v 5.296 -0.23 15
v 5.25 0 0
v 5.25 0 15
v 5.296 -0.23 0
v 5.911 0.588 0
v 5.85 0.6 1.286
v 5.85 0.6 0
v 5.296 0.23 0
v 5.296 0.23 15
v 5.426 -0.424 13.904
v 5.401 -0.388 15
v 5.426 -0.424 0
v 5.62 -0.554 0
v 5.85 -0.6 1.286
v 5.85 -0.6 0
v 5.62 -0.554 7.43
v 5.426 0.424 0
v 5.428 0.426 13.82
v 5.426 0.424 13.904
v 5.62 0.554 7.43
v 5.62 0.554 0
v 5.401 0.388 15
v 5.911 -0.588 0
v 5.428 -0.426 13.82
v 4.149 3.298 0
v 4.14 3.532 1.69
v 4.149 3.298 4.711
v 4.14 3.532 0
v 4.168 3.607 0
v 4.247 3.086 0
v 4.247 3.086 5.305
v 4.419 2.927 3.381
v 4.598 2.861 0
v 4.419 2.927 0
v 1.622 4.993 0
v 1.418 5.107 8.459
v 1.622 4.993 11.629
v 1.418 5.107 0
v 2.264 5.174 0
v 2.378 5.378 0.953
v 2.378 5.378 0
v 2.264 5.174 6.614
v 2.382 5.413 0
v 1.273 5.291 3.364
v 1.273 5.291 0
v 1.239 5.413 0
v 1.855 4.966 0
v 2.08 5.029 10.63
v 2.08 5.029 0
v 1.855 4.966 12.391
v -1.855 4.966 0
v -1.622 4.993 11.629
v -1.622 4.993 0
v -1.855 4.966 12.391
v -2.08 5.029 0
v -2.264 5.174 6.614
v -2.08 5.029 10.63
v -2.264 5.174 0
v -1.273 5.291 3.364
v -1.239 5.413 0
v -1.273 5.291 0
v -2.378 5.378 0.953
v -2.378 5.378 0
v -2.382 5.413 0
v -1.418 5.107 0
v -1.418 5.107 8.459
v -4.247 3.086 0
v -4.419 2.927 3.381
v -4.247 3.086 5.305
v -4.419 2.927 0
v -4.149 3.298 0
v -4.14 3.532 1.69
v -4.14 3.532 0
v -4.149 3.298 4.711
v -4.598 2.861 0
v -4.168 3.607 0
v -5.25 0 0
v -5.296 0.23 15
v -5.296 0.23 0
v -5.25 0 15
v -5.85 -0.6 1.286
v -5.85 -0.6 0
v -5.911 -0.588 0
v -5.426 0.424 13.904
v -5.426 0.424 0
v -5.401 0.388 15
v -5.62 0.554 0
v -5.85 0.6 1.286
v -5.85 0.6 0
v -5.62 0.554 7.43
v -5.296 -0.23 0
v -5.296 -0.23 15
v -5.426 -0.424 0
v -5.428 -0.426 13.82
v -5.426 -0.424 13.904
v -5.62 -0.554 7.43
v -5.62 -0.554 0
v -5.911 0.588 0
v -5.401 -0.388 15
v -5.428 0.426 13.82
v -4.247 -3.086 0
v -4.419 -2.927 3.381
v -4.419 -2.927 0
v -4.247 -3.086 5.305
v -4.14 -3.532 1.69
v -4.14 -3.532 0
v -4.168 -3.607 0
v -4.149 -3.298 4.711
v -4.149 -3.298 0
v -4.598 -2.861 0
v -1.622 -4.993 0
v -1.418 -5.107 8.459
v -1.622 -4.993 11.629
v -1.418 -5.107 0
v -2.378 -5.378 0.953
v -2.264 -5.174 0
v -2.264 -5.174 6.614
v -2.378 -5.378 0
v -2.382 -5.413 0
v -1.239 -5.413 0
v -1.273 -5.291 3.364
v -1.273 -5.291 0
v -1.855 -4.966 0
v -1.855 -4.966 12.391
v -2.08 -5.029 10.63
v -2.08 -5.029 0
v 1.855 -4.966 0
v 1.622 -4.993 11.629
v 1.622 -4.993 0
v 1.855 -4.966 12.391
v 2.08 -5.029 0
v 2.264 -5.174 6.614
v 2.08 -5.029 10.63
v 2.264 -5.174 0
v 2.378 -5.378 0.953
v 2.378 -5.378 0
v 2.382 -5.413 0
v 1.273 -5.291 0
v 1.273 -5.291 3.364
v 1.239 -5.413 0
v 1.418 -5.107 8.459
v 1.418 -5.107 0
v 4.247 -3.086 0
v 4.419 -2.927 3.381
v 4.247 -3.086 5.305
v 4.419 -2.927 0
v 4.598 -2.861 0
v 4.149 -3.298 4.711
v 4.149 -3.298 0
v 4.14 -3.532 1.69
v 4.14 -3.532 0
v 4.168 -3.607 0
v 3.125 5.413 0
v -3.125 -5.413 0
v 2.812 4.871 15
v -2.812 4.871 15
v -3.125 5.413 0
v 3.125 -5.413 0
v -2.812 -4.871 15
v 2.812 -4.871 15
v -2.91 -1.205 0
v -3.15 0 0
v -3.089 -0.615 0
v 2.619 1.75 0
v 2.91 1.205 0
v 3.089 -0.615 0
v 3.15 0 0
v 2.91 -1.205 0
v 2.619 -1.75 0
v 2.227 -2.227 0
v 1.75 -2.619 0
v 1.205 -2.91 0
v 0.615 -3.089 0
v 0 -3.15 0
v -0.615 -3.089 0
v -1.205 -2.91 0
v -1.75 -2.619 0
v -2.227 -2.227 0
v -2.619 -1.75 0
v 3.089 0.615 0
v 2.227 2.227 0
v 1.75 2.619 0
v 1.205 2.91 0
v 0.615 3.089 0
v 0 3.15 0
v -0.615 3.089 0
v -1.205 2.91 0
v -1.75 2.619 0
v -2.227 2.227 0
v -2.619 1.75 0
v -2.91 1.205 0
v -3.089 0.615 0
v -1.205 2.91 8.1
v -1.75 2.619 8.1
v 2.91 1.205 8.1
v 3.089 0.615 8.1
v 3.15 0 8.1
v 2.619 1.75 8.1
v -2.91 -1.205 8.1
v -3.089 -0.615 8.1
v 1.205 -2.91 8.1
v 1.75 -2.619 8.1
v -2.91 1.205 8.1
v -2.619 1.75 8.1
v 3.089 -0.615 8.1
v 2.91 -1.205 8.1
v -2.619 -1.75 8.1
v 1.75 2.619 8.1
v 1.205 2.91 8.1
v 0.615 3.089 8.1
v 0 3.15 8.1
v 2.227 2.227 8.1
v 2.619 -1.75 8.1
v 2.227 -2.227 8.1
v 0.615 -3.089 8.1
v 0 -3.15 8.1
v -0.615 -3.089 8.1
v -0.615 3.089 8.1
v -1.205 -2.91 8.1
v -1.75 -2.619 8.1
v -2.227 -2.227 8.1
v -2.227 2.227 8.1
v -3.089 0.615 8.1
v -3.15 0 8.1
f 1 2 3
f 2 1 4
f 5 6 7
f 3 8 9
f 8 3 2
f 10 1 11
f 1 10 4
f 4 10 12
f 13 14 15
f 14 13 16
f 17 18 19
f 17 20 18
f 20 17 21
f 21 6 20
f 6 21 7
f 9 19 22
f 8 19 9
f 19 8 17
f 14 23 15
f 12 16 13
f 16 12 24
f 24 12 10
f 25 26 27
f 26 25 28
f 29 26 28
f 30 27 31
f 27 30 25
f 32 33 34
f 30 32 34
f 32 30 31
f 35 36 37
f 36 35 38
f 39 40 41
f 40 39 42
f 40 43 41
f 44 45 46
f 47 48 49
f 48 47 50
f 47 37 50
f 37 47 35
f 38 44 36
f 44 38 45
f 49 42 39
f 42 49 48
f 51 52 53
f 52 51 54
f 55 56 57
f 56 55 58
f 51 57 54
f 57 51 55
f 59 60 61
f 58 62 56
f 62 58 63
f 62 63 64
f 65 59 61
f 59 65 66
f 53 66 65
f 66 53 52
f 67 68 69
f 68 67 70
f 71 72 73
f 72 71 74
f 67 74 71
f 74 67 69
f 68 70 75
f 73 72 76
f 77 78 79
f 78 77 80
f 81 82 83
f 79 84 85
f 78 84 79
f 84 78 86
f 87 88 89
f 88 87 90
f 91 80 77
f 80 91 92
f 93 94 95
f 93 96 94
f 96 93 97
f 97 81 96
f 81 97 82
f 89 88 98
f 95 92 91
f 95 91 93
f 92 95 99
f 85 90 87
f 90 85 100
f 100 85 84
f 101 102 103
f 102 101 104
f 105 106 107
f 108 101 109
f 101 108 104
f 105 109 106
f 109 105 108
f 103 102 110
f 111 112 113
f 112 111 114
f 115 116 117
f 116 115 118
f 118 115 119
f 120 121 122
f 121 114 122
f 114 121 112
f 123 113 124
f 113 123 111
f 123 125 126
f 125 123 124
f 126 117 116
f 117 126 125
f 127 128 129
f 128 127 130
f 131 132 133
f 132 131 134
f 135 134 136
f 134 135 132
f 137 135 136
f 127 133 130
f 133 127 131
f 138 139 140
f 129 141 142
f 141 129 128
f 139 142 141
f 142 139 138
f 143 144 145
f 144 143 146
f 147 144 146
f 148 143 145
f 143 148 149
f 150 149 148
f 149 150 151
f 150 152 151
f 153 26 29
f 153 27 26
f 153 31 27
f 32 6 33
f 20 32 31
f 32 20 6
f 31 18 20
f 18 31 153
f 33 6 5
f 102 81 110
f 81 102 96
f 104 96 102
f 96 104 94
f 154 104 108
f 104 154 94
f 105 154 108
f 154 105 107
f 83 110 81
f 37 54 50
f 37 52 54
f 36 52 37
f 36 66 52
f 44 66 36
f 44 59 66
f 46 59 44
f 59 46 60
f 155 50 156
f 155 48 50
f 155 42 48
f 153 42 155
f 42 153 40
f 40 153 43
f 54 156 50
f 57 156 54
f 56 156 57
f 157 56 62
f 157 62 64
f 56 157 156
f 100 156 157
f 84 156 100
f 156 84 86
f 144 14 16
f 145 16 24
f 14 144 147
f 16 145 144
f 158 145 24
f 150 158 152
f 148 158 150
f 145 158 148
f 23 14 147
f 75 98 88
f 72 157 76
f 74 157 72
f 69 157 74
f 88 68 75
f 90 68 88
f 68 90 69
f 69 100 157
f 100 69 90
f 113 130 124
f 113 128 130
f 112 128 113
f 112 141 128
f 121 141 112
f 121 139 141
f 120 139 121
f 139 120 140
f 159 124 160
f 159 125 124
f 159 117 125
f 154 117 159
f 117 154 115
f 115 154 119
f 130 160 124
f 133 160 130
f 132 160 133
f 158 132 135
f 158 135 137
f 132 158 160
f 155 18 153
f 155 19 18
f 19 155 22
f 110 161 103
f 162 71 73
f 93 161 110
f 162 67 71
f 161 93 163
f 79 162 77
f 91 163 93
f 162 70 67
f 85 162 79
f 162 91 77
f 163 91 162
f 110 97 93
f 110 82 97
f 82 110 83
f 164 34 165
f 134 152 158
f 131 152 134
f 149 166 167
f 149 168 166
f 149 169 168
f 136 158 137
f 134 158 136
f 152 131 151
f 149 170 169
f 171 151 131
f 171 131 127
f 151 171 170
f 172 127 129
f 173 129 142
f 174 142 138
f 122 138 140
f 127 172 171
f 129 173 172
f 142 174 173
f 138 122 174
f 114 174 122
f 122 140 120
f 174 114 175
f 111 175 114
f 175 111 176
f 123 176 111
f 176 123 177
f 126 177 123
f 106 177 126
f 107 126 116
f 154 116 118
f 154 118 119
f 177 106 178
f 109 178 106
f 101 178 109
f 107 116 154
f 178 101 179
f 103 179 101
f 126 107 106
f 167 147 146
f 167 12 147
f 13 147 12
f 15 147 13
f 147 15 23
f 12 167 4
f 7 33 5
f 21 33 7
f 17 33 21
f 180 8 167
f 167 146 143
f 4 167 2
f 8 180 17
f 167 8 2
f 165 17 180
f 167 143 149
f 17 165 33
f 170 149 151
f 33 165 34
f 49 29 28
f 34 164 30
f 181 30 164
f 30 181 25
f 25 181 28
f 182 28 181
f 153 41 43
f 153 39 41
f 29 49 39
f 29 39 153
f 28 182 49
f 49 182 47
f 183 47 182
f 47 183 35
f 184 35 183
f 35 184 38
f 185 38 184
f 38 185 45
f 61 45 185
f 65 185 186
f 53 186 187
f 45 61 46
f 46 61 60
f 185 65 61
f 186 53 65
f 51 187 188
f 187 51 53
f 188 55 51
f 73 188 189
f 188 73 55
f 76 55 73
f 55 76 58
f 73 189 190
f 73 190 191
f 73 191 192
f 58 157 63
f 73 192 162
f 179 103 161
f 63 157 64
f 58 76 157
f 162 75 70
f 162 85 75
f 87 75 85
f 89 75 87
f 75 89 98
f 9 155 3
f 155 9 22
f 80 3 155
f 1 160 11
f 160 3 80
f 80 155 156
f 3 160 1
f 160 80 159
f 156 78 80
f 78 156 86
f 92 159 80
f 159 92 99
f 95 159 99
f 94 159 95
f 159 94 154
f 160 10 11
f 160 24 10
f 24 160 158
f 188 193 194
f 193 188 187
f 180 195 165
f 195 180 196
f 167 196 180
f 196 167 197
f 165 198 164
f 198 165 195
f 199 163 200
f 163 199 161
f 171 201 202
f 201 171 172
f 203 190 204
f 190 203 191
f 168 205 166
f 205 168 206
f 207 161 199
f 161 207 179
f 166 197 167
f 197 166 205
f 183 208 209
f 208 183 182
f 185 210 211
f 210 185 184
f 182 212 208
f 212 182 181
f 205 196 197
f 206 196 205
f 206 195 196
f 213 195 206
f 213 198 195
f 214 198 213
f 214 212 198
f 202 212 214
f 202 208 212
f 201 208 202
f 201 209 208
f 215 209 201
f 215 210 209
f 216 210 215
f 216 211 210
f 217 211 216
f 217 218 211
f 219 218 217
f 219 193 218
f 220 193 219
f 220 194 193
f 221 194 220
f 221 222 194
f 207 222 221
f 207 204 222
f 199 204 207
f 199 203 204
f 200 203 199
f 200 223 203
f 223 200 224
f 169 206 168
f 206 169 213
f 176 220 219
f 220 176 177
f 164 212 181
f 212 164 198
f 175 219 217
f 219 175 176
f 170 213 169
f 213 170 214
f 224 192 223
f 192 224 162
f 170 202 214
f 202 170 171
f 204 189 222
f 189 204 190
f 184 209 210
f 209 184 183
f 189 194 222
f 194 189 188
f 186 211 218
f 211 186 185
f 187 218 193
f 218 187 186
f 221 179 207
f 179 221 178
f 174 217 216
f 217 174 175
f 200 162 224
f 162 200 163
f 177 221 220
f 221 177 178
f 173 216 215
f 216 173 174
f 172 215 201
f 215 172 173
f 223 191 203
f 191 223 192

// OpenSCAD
// ACCESS KNOB — Standard Eurorack Module Knob
// Generated via CLI for Studio Knobs
module access_knob_eurorack_std() {
  outer_d = 12.5;
  height = 15;
  taper = 0.9;
  bore_d = 6;
  slot_h = 8;
  tex_depth = 0.8;
  tex_scale = 1.2;
  tex_count = 10;

  difference() {
    cylinder(h=height, d1=outer_d, d2=outer_d*taper, $fn=6);
    translate([0,0,-0.1]) cylinder(h=slot_h+0.2, d=bore_d + 0.3, $fn=32);
    for(i=[0:tex_count-1]) {
      rotate([0,0,i*(360/tex_count)])
        translate([outer_d/2-tex_depth/2, 0, height/2])
          cylinder(h=height*1.1, d=tex_scale, center=true, $fn=16);
    }
  }
}
access_knob_eurorack_std();
